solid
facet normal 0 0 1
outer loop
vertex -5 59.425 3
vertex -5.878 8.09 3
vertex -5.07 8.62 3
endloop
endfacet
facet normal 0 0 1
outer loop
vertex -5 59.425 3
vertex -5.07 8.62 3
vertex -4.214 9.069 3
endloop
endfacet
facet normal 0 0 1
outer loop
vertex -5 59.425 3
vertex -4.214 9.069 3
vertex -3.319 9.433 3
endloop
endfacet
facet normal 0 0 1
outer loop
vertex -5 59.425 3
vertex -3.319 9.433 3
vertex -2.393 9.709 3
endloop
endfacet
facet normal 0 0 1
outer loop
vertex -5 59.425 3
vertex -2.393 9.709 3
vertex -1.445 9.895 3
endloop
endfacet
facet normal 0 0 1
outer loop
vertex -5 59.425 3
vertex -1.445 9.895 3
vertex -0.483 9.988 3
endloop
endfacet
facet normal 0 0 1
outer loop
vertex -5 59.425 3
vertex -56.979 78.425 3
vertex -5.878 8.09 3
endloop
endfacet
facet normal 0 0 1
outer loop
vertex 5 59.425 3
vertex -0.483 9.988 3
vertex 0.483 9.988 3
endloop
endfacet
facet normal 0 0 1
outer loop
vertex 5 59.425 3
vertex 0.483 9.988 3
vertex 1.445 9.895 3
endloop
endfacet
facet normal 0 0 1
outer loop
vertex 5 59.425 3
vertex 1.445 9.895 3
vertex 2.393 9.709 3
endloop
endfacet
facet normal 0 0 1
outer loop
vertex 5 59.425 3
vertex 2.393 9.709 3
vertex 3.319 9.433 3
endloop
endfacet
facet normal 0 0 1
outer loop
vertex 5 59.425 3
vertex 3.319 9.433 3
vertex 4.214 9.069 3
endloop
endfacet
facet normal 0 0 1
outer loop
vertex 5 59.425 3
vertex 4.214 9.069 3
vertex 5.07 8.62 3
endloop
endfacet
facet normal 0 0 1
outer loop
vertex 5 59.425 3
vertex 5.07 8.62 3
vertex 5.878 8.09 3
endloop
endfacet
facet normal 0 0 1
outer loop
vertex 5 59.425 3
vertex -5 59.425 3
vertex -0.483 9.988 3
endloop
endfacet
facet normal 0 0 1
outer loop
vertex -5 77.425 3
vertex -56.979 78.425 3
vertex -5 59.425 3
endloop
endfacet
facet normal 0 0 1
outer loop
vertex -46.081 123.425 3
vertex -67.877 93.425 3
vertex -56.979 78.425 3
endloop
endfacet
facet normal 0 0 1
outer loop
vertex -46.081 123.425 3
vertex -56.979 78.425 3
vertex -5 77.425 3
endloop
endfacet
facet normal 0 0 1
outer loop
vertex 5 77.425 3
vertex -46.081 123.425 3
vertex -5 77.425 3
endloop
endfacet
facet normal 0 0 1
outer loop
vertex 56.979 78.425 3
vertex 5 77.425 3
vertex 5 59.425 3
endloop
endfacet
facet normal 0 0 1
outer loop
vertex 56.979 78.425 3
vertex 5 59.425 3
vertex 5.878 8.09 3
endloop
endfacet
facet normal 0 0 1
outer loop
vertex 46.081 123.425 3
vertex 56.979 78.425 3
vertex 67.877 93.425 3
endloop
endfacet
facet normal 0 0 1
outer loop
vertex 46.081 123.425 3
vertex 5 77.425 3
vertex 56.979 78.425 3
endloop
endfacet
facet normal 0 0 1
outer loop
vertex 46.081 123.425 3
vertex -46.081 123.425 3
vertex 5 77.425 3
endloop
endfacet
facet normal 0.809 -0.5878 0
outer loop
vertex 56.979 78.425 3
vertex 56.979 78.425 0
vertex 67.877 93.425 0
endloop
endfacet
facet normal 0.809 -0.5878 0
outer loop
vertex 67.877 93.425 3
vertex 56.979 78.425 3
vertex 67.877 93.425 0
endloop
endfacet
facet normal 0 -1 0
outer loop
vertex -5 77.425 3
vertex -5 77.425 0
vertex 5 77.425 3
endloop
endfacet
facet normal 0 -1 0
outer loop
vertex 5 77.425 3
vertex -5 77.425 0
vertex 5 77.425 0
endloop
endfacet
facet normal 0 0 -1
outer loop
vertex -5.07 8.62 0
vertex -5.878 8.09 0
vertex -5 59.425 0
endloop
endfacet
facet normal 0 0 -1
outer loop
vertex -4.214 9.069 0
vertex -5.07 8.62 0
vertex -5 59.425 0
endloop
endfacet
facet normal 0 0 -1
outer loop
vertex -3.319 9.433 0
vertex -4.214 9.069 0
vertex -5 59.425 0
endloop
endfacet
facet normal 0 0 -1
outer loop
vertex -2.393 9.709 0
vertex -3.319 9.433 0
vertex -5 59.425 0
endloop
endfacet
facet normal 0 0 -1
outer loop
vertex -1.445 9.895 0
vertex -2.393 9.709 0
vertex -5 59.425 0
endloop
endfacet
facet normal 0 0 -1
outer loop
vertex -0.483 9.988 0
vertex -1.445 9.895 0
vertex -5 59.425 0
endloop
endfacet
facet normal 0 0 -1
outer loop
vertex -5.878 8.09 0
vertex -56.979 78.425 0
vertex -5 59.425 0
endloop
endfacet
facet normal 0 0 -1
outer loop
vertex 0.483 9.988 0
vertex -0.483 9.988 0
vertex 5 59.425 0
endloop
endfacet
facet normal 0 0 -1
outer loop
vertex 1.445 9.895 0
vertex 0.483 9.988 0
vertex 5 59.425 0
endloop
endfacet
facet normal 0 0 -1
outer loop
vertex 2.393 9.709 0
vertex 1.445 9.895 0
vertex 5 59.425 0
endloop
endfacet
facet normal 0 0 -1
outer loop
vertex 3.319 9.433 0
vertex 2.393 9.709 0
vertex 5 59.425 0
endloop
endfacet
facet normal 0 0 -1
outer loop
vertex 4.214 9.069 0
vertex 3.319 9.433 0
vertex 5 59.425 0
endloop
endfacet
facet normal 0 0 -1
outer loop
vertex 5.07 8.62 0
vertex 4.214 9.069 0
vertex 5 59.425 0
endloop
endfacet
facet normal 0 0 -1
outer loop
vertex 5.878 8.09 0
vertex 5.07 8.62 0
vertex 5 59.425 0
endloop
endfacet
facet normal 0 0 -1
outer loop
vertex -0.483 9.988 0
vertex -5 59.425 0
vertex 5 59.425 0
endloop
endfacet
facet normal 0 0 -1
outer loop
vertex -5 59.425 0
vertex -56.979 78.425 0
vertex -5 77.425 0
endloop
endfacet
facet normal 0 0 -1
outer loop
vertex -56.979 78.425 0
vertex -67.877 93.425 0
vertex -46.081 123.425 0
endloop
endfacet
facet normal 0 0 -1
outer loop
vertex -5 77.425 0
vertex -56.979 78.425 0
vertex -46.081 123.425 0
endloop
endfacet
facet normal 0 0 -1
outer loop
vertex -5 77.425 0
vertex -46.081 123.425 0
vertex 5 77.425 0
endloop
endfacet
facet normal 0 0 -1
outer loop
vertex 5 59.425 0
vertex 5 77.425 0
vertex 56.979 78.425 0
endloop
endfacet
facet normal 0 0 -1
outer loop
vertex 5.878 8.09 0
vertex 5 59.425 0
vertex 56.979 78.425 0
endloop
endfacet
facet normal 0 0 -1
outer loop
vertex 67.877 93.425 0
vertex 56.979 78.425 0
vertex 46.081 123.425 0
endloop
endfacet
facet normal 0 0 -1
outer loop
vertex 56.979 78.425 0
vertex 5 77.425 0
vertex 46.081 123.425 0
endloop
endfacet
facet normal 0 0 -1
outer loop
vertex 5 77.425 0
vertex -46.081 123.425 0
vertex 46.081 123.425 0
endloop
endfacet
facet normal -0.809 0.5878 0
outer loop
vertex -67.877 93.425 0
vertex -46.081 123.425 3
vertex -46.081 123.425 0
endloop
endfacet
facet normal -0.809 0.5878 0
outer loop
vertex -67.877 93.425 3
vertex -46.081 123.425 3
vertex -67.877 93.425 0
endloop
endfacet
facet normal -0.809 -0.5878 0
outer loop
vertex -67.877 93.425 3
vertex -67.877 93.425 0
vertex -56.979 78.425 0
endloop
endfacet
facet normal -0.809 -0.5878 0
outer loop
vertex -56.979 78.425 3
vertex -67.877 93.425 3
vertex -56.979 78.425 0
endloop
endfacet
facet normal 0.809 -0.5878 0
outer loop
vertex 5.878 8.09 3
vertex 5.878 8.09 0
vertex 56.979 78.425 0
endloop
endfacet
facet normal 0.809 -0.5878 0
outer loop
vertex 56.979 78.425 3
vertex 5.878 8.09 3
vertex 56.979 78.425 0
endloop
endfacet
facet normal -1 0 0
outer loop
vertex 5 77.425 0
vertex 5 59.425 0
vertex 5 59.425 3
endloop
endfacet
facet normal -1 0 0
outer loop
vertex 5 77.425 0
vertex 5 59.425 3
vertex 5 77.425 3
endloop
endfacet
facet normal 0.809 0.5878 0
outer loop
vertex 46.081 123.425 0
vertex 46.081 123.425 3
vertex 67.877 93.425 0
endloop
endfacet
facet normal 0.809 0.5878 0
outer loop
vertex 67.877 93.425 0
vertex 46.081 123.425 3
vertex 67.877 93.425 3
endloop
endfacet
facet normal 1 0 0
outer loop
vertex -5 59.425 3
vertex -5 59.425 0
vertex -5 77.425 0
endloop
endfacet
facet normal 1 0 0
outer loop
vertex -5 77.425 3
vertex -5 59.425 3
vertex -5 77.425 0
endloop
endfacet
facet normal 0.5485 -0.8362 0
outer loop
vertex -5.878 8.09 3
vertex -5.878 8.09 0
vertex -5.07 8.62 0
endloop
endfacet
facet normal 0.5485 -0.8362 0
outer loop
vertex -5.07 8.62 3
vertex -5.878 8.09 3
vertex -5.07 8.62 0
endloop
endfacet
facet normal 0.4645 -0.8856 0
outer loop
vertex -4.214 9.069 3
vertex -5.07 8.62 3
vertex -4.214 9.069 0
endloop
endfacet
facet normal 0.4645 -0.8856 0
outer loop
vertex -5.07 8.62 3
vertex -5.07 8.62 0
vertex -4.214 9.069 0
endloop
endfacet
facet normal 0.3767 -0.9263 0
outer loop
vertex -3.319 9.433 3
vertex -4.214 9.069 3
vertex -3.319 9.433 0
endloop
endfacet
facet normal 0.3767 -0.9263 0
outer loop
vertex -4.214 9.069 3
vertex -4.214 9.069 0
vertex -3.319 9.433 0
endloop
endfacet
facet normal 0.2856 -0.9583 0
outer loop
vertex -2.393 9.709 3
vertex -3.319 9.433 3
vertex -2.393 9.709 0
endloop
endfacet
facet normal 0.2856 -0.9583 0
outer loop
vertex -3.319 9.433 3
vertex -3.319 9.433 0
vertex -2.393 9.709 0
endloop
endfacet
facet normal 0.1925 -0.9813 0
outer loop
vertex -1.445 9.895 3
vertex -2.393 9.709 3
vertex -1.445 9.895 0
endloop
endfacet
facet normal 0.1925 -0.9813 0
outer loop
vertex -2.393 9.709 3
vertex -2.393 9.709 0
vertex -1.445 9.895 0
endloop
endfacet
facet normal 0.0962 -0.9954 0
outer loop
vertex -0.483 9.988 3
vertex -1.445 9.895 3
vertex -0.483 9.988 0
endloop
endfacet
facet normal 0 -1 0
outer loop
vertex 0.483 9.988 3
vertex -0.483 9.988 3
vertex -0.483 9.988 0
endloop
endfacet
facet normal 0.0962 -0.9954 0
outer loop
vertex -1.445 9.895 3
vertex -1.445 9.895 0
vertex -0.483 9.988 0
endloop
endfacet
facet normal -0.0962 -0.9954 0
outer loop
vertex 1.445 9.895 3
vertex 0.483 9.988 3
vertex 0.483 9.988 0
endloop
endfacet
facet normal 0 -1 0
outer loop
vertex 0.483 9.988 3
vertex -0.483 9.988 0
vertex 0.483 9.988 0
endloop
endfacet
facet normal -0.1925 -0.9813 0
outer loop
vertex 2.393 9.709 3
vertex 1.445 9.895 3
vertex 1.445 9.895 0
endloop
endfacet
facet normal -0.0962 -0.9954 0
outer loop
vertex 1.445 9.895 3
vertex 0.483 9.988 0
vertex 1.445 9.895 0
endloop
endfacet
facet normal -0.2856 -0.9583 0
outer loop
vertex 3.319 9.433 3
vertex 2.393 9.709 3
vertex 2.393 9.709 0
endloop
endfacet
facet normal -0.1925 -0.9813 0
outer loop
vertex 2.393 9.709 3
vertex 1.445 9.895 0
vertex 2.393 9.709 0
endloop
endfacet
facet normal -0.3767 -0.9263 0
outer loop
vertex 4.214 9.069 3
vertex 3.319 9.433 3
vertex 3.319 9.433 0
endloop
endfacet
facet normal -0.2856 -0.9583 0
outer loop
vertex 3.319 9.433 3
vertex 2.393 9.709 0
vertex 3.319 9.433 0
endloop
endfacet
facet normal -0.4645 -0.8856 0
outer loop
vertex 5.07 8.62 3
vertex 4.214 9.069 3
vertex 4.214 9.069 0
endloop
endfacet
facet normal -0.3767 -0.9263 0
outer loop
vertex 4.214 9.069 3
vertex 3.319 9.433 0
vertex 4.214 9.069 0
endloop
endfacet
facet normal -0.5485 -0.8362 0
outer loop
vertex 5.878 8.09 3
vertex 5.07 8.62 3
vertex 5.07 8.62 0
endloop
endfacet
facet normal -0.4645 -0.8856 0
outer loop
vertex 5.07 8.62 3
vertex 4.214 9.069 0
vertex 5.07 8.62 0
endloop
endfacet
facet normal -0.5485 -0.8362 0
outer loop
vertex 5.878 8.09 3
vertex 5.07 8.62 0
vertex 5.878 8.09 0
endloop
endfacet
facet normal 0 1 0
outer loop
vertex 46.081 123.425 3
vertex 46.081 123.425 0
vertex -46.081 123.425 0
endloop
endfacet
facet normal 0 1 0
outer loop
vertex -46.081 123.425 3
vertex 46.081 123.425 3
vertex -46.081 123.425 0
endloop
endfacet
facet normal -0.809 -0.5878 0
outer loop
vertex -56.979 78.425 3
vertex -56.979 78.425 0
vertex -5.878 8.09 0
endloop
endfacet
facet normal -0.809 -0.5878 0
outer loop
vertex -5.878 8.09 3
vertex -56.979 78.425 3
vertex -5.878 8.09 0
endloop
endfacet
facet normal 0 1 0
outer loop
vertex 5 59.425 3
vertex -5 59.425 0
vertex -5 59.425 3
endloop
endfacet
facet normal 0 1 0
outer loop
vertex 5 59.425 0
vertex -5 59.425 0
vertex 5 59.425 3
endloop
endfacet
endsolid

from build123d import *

# Parameters (mm, degrees)
SKETCH3_W           = 10
SKETCH3_H           = 18
BOSS_EXTRUDE1_DEPTH = 3
BOSS_EXTRUDE2_DEPTH = 3
CUT_EXTRUDE1_DEPTH  = 4
SKETCH6_R           = 10
CUT_EXTRUDE2_DEPTH  = 4


with BuildPart() as part:
    # Sketch3 → Boss-Extrude1 (new body)
    with BuildSketch(Plane.XY):
        Polygon((0, 0), (56.979097759, 78.425), (-56.979097759, 78.425), align=None)
        with Locations((0, 68.425)):
            Rectangle(SKETCH3_W, SKETCH3_H, mode=Mode.SUBTRACT)
    extrude(amount=BOSS_EXTRUDE1_DEPTH)

    # Sketch4 → Boss-Extrude2 (add)
    with BuildSketch(Plane(origin=(0, 0, 0), x_dir=(-1, 0, 0), z_dir=(0, 0, -1))):
        Polygon((-56.979097759, 78.425), (-89.673511519, 123.425), (89.673511519, 123.425), (56.979097759, 78.425), align=None)
    extrude(amount=-BOSS_EXTRUDE2_DEPTH)

    # Sketch5 → Cut-Extrude1 (cut, through all)
    with BuildSketch(Plane.XY.offset(3)):
        Polygon((-89.673511519, 123.425), (-46.080959839, 123.425), (-67.877235679, 93.425), align=None)
        Polygon((89.673511519, 123.425), (46.080959839, 123.425), (67.877235679, 93.425), align=None)
    extrude(amount=-CUT_EXTRUDE1_DEPTH, mode=Mode.SUBTRACT)

    # Sketch6 → Cut-Extrude2 (cut, through all)
    with BuildSketch(Plane(origin=(0, 0, 0), x_dir=(-1, 0, 0), z_dir=(0, 0, -1))):
        Circle(SKETCH6_R)
    extrude(amount=-CUT_EXTRUDE2_DEPTH, mode=Mode.SUBTRACT)


solid = part.part
